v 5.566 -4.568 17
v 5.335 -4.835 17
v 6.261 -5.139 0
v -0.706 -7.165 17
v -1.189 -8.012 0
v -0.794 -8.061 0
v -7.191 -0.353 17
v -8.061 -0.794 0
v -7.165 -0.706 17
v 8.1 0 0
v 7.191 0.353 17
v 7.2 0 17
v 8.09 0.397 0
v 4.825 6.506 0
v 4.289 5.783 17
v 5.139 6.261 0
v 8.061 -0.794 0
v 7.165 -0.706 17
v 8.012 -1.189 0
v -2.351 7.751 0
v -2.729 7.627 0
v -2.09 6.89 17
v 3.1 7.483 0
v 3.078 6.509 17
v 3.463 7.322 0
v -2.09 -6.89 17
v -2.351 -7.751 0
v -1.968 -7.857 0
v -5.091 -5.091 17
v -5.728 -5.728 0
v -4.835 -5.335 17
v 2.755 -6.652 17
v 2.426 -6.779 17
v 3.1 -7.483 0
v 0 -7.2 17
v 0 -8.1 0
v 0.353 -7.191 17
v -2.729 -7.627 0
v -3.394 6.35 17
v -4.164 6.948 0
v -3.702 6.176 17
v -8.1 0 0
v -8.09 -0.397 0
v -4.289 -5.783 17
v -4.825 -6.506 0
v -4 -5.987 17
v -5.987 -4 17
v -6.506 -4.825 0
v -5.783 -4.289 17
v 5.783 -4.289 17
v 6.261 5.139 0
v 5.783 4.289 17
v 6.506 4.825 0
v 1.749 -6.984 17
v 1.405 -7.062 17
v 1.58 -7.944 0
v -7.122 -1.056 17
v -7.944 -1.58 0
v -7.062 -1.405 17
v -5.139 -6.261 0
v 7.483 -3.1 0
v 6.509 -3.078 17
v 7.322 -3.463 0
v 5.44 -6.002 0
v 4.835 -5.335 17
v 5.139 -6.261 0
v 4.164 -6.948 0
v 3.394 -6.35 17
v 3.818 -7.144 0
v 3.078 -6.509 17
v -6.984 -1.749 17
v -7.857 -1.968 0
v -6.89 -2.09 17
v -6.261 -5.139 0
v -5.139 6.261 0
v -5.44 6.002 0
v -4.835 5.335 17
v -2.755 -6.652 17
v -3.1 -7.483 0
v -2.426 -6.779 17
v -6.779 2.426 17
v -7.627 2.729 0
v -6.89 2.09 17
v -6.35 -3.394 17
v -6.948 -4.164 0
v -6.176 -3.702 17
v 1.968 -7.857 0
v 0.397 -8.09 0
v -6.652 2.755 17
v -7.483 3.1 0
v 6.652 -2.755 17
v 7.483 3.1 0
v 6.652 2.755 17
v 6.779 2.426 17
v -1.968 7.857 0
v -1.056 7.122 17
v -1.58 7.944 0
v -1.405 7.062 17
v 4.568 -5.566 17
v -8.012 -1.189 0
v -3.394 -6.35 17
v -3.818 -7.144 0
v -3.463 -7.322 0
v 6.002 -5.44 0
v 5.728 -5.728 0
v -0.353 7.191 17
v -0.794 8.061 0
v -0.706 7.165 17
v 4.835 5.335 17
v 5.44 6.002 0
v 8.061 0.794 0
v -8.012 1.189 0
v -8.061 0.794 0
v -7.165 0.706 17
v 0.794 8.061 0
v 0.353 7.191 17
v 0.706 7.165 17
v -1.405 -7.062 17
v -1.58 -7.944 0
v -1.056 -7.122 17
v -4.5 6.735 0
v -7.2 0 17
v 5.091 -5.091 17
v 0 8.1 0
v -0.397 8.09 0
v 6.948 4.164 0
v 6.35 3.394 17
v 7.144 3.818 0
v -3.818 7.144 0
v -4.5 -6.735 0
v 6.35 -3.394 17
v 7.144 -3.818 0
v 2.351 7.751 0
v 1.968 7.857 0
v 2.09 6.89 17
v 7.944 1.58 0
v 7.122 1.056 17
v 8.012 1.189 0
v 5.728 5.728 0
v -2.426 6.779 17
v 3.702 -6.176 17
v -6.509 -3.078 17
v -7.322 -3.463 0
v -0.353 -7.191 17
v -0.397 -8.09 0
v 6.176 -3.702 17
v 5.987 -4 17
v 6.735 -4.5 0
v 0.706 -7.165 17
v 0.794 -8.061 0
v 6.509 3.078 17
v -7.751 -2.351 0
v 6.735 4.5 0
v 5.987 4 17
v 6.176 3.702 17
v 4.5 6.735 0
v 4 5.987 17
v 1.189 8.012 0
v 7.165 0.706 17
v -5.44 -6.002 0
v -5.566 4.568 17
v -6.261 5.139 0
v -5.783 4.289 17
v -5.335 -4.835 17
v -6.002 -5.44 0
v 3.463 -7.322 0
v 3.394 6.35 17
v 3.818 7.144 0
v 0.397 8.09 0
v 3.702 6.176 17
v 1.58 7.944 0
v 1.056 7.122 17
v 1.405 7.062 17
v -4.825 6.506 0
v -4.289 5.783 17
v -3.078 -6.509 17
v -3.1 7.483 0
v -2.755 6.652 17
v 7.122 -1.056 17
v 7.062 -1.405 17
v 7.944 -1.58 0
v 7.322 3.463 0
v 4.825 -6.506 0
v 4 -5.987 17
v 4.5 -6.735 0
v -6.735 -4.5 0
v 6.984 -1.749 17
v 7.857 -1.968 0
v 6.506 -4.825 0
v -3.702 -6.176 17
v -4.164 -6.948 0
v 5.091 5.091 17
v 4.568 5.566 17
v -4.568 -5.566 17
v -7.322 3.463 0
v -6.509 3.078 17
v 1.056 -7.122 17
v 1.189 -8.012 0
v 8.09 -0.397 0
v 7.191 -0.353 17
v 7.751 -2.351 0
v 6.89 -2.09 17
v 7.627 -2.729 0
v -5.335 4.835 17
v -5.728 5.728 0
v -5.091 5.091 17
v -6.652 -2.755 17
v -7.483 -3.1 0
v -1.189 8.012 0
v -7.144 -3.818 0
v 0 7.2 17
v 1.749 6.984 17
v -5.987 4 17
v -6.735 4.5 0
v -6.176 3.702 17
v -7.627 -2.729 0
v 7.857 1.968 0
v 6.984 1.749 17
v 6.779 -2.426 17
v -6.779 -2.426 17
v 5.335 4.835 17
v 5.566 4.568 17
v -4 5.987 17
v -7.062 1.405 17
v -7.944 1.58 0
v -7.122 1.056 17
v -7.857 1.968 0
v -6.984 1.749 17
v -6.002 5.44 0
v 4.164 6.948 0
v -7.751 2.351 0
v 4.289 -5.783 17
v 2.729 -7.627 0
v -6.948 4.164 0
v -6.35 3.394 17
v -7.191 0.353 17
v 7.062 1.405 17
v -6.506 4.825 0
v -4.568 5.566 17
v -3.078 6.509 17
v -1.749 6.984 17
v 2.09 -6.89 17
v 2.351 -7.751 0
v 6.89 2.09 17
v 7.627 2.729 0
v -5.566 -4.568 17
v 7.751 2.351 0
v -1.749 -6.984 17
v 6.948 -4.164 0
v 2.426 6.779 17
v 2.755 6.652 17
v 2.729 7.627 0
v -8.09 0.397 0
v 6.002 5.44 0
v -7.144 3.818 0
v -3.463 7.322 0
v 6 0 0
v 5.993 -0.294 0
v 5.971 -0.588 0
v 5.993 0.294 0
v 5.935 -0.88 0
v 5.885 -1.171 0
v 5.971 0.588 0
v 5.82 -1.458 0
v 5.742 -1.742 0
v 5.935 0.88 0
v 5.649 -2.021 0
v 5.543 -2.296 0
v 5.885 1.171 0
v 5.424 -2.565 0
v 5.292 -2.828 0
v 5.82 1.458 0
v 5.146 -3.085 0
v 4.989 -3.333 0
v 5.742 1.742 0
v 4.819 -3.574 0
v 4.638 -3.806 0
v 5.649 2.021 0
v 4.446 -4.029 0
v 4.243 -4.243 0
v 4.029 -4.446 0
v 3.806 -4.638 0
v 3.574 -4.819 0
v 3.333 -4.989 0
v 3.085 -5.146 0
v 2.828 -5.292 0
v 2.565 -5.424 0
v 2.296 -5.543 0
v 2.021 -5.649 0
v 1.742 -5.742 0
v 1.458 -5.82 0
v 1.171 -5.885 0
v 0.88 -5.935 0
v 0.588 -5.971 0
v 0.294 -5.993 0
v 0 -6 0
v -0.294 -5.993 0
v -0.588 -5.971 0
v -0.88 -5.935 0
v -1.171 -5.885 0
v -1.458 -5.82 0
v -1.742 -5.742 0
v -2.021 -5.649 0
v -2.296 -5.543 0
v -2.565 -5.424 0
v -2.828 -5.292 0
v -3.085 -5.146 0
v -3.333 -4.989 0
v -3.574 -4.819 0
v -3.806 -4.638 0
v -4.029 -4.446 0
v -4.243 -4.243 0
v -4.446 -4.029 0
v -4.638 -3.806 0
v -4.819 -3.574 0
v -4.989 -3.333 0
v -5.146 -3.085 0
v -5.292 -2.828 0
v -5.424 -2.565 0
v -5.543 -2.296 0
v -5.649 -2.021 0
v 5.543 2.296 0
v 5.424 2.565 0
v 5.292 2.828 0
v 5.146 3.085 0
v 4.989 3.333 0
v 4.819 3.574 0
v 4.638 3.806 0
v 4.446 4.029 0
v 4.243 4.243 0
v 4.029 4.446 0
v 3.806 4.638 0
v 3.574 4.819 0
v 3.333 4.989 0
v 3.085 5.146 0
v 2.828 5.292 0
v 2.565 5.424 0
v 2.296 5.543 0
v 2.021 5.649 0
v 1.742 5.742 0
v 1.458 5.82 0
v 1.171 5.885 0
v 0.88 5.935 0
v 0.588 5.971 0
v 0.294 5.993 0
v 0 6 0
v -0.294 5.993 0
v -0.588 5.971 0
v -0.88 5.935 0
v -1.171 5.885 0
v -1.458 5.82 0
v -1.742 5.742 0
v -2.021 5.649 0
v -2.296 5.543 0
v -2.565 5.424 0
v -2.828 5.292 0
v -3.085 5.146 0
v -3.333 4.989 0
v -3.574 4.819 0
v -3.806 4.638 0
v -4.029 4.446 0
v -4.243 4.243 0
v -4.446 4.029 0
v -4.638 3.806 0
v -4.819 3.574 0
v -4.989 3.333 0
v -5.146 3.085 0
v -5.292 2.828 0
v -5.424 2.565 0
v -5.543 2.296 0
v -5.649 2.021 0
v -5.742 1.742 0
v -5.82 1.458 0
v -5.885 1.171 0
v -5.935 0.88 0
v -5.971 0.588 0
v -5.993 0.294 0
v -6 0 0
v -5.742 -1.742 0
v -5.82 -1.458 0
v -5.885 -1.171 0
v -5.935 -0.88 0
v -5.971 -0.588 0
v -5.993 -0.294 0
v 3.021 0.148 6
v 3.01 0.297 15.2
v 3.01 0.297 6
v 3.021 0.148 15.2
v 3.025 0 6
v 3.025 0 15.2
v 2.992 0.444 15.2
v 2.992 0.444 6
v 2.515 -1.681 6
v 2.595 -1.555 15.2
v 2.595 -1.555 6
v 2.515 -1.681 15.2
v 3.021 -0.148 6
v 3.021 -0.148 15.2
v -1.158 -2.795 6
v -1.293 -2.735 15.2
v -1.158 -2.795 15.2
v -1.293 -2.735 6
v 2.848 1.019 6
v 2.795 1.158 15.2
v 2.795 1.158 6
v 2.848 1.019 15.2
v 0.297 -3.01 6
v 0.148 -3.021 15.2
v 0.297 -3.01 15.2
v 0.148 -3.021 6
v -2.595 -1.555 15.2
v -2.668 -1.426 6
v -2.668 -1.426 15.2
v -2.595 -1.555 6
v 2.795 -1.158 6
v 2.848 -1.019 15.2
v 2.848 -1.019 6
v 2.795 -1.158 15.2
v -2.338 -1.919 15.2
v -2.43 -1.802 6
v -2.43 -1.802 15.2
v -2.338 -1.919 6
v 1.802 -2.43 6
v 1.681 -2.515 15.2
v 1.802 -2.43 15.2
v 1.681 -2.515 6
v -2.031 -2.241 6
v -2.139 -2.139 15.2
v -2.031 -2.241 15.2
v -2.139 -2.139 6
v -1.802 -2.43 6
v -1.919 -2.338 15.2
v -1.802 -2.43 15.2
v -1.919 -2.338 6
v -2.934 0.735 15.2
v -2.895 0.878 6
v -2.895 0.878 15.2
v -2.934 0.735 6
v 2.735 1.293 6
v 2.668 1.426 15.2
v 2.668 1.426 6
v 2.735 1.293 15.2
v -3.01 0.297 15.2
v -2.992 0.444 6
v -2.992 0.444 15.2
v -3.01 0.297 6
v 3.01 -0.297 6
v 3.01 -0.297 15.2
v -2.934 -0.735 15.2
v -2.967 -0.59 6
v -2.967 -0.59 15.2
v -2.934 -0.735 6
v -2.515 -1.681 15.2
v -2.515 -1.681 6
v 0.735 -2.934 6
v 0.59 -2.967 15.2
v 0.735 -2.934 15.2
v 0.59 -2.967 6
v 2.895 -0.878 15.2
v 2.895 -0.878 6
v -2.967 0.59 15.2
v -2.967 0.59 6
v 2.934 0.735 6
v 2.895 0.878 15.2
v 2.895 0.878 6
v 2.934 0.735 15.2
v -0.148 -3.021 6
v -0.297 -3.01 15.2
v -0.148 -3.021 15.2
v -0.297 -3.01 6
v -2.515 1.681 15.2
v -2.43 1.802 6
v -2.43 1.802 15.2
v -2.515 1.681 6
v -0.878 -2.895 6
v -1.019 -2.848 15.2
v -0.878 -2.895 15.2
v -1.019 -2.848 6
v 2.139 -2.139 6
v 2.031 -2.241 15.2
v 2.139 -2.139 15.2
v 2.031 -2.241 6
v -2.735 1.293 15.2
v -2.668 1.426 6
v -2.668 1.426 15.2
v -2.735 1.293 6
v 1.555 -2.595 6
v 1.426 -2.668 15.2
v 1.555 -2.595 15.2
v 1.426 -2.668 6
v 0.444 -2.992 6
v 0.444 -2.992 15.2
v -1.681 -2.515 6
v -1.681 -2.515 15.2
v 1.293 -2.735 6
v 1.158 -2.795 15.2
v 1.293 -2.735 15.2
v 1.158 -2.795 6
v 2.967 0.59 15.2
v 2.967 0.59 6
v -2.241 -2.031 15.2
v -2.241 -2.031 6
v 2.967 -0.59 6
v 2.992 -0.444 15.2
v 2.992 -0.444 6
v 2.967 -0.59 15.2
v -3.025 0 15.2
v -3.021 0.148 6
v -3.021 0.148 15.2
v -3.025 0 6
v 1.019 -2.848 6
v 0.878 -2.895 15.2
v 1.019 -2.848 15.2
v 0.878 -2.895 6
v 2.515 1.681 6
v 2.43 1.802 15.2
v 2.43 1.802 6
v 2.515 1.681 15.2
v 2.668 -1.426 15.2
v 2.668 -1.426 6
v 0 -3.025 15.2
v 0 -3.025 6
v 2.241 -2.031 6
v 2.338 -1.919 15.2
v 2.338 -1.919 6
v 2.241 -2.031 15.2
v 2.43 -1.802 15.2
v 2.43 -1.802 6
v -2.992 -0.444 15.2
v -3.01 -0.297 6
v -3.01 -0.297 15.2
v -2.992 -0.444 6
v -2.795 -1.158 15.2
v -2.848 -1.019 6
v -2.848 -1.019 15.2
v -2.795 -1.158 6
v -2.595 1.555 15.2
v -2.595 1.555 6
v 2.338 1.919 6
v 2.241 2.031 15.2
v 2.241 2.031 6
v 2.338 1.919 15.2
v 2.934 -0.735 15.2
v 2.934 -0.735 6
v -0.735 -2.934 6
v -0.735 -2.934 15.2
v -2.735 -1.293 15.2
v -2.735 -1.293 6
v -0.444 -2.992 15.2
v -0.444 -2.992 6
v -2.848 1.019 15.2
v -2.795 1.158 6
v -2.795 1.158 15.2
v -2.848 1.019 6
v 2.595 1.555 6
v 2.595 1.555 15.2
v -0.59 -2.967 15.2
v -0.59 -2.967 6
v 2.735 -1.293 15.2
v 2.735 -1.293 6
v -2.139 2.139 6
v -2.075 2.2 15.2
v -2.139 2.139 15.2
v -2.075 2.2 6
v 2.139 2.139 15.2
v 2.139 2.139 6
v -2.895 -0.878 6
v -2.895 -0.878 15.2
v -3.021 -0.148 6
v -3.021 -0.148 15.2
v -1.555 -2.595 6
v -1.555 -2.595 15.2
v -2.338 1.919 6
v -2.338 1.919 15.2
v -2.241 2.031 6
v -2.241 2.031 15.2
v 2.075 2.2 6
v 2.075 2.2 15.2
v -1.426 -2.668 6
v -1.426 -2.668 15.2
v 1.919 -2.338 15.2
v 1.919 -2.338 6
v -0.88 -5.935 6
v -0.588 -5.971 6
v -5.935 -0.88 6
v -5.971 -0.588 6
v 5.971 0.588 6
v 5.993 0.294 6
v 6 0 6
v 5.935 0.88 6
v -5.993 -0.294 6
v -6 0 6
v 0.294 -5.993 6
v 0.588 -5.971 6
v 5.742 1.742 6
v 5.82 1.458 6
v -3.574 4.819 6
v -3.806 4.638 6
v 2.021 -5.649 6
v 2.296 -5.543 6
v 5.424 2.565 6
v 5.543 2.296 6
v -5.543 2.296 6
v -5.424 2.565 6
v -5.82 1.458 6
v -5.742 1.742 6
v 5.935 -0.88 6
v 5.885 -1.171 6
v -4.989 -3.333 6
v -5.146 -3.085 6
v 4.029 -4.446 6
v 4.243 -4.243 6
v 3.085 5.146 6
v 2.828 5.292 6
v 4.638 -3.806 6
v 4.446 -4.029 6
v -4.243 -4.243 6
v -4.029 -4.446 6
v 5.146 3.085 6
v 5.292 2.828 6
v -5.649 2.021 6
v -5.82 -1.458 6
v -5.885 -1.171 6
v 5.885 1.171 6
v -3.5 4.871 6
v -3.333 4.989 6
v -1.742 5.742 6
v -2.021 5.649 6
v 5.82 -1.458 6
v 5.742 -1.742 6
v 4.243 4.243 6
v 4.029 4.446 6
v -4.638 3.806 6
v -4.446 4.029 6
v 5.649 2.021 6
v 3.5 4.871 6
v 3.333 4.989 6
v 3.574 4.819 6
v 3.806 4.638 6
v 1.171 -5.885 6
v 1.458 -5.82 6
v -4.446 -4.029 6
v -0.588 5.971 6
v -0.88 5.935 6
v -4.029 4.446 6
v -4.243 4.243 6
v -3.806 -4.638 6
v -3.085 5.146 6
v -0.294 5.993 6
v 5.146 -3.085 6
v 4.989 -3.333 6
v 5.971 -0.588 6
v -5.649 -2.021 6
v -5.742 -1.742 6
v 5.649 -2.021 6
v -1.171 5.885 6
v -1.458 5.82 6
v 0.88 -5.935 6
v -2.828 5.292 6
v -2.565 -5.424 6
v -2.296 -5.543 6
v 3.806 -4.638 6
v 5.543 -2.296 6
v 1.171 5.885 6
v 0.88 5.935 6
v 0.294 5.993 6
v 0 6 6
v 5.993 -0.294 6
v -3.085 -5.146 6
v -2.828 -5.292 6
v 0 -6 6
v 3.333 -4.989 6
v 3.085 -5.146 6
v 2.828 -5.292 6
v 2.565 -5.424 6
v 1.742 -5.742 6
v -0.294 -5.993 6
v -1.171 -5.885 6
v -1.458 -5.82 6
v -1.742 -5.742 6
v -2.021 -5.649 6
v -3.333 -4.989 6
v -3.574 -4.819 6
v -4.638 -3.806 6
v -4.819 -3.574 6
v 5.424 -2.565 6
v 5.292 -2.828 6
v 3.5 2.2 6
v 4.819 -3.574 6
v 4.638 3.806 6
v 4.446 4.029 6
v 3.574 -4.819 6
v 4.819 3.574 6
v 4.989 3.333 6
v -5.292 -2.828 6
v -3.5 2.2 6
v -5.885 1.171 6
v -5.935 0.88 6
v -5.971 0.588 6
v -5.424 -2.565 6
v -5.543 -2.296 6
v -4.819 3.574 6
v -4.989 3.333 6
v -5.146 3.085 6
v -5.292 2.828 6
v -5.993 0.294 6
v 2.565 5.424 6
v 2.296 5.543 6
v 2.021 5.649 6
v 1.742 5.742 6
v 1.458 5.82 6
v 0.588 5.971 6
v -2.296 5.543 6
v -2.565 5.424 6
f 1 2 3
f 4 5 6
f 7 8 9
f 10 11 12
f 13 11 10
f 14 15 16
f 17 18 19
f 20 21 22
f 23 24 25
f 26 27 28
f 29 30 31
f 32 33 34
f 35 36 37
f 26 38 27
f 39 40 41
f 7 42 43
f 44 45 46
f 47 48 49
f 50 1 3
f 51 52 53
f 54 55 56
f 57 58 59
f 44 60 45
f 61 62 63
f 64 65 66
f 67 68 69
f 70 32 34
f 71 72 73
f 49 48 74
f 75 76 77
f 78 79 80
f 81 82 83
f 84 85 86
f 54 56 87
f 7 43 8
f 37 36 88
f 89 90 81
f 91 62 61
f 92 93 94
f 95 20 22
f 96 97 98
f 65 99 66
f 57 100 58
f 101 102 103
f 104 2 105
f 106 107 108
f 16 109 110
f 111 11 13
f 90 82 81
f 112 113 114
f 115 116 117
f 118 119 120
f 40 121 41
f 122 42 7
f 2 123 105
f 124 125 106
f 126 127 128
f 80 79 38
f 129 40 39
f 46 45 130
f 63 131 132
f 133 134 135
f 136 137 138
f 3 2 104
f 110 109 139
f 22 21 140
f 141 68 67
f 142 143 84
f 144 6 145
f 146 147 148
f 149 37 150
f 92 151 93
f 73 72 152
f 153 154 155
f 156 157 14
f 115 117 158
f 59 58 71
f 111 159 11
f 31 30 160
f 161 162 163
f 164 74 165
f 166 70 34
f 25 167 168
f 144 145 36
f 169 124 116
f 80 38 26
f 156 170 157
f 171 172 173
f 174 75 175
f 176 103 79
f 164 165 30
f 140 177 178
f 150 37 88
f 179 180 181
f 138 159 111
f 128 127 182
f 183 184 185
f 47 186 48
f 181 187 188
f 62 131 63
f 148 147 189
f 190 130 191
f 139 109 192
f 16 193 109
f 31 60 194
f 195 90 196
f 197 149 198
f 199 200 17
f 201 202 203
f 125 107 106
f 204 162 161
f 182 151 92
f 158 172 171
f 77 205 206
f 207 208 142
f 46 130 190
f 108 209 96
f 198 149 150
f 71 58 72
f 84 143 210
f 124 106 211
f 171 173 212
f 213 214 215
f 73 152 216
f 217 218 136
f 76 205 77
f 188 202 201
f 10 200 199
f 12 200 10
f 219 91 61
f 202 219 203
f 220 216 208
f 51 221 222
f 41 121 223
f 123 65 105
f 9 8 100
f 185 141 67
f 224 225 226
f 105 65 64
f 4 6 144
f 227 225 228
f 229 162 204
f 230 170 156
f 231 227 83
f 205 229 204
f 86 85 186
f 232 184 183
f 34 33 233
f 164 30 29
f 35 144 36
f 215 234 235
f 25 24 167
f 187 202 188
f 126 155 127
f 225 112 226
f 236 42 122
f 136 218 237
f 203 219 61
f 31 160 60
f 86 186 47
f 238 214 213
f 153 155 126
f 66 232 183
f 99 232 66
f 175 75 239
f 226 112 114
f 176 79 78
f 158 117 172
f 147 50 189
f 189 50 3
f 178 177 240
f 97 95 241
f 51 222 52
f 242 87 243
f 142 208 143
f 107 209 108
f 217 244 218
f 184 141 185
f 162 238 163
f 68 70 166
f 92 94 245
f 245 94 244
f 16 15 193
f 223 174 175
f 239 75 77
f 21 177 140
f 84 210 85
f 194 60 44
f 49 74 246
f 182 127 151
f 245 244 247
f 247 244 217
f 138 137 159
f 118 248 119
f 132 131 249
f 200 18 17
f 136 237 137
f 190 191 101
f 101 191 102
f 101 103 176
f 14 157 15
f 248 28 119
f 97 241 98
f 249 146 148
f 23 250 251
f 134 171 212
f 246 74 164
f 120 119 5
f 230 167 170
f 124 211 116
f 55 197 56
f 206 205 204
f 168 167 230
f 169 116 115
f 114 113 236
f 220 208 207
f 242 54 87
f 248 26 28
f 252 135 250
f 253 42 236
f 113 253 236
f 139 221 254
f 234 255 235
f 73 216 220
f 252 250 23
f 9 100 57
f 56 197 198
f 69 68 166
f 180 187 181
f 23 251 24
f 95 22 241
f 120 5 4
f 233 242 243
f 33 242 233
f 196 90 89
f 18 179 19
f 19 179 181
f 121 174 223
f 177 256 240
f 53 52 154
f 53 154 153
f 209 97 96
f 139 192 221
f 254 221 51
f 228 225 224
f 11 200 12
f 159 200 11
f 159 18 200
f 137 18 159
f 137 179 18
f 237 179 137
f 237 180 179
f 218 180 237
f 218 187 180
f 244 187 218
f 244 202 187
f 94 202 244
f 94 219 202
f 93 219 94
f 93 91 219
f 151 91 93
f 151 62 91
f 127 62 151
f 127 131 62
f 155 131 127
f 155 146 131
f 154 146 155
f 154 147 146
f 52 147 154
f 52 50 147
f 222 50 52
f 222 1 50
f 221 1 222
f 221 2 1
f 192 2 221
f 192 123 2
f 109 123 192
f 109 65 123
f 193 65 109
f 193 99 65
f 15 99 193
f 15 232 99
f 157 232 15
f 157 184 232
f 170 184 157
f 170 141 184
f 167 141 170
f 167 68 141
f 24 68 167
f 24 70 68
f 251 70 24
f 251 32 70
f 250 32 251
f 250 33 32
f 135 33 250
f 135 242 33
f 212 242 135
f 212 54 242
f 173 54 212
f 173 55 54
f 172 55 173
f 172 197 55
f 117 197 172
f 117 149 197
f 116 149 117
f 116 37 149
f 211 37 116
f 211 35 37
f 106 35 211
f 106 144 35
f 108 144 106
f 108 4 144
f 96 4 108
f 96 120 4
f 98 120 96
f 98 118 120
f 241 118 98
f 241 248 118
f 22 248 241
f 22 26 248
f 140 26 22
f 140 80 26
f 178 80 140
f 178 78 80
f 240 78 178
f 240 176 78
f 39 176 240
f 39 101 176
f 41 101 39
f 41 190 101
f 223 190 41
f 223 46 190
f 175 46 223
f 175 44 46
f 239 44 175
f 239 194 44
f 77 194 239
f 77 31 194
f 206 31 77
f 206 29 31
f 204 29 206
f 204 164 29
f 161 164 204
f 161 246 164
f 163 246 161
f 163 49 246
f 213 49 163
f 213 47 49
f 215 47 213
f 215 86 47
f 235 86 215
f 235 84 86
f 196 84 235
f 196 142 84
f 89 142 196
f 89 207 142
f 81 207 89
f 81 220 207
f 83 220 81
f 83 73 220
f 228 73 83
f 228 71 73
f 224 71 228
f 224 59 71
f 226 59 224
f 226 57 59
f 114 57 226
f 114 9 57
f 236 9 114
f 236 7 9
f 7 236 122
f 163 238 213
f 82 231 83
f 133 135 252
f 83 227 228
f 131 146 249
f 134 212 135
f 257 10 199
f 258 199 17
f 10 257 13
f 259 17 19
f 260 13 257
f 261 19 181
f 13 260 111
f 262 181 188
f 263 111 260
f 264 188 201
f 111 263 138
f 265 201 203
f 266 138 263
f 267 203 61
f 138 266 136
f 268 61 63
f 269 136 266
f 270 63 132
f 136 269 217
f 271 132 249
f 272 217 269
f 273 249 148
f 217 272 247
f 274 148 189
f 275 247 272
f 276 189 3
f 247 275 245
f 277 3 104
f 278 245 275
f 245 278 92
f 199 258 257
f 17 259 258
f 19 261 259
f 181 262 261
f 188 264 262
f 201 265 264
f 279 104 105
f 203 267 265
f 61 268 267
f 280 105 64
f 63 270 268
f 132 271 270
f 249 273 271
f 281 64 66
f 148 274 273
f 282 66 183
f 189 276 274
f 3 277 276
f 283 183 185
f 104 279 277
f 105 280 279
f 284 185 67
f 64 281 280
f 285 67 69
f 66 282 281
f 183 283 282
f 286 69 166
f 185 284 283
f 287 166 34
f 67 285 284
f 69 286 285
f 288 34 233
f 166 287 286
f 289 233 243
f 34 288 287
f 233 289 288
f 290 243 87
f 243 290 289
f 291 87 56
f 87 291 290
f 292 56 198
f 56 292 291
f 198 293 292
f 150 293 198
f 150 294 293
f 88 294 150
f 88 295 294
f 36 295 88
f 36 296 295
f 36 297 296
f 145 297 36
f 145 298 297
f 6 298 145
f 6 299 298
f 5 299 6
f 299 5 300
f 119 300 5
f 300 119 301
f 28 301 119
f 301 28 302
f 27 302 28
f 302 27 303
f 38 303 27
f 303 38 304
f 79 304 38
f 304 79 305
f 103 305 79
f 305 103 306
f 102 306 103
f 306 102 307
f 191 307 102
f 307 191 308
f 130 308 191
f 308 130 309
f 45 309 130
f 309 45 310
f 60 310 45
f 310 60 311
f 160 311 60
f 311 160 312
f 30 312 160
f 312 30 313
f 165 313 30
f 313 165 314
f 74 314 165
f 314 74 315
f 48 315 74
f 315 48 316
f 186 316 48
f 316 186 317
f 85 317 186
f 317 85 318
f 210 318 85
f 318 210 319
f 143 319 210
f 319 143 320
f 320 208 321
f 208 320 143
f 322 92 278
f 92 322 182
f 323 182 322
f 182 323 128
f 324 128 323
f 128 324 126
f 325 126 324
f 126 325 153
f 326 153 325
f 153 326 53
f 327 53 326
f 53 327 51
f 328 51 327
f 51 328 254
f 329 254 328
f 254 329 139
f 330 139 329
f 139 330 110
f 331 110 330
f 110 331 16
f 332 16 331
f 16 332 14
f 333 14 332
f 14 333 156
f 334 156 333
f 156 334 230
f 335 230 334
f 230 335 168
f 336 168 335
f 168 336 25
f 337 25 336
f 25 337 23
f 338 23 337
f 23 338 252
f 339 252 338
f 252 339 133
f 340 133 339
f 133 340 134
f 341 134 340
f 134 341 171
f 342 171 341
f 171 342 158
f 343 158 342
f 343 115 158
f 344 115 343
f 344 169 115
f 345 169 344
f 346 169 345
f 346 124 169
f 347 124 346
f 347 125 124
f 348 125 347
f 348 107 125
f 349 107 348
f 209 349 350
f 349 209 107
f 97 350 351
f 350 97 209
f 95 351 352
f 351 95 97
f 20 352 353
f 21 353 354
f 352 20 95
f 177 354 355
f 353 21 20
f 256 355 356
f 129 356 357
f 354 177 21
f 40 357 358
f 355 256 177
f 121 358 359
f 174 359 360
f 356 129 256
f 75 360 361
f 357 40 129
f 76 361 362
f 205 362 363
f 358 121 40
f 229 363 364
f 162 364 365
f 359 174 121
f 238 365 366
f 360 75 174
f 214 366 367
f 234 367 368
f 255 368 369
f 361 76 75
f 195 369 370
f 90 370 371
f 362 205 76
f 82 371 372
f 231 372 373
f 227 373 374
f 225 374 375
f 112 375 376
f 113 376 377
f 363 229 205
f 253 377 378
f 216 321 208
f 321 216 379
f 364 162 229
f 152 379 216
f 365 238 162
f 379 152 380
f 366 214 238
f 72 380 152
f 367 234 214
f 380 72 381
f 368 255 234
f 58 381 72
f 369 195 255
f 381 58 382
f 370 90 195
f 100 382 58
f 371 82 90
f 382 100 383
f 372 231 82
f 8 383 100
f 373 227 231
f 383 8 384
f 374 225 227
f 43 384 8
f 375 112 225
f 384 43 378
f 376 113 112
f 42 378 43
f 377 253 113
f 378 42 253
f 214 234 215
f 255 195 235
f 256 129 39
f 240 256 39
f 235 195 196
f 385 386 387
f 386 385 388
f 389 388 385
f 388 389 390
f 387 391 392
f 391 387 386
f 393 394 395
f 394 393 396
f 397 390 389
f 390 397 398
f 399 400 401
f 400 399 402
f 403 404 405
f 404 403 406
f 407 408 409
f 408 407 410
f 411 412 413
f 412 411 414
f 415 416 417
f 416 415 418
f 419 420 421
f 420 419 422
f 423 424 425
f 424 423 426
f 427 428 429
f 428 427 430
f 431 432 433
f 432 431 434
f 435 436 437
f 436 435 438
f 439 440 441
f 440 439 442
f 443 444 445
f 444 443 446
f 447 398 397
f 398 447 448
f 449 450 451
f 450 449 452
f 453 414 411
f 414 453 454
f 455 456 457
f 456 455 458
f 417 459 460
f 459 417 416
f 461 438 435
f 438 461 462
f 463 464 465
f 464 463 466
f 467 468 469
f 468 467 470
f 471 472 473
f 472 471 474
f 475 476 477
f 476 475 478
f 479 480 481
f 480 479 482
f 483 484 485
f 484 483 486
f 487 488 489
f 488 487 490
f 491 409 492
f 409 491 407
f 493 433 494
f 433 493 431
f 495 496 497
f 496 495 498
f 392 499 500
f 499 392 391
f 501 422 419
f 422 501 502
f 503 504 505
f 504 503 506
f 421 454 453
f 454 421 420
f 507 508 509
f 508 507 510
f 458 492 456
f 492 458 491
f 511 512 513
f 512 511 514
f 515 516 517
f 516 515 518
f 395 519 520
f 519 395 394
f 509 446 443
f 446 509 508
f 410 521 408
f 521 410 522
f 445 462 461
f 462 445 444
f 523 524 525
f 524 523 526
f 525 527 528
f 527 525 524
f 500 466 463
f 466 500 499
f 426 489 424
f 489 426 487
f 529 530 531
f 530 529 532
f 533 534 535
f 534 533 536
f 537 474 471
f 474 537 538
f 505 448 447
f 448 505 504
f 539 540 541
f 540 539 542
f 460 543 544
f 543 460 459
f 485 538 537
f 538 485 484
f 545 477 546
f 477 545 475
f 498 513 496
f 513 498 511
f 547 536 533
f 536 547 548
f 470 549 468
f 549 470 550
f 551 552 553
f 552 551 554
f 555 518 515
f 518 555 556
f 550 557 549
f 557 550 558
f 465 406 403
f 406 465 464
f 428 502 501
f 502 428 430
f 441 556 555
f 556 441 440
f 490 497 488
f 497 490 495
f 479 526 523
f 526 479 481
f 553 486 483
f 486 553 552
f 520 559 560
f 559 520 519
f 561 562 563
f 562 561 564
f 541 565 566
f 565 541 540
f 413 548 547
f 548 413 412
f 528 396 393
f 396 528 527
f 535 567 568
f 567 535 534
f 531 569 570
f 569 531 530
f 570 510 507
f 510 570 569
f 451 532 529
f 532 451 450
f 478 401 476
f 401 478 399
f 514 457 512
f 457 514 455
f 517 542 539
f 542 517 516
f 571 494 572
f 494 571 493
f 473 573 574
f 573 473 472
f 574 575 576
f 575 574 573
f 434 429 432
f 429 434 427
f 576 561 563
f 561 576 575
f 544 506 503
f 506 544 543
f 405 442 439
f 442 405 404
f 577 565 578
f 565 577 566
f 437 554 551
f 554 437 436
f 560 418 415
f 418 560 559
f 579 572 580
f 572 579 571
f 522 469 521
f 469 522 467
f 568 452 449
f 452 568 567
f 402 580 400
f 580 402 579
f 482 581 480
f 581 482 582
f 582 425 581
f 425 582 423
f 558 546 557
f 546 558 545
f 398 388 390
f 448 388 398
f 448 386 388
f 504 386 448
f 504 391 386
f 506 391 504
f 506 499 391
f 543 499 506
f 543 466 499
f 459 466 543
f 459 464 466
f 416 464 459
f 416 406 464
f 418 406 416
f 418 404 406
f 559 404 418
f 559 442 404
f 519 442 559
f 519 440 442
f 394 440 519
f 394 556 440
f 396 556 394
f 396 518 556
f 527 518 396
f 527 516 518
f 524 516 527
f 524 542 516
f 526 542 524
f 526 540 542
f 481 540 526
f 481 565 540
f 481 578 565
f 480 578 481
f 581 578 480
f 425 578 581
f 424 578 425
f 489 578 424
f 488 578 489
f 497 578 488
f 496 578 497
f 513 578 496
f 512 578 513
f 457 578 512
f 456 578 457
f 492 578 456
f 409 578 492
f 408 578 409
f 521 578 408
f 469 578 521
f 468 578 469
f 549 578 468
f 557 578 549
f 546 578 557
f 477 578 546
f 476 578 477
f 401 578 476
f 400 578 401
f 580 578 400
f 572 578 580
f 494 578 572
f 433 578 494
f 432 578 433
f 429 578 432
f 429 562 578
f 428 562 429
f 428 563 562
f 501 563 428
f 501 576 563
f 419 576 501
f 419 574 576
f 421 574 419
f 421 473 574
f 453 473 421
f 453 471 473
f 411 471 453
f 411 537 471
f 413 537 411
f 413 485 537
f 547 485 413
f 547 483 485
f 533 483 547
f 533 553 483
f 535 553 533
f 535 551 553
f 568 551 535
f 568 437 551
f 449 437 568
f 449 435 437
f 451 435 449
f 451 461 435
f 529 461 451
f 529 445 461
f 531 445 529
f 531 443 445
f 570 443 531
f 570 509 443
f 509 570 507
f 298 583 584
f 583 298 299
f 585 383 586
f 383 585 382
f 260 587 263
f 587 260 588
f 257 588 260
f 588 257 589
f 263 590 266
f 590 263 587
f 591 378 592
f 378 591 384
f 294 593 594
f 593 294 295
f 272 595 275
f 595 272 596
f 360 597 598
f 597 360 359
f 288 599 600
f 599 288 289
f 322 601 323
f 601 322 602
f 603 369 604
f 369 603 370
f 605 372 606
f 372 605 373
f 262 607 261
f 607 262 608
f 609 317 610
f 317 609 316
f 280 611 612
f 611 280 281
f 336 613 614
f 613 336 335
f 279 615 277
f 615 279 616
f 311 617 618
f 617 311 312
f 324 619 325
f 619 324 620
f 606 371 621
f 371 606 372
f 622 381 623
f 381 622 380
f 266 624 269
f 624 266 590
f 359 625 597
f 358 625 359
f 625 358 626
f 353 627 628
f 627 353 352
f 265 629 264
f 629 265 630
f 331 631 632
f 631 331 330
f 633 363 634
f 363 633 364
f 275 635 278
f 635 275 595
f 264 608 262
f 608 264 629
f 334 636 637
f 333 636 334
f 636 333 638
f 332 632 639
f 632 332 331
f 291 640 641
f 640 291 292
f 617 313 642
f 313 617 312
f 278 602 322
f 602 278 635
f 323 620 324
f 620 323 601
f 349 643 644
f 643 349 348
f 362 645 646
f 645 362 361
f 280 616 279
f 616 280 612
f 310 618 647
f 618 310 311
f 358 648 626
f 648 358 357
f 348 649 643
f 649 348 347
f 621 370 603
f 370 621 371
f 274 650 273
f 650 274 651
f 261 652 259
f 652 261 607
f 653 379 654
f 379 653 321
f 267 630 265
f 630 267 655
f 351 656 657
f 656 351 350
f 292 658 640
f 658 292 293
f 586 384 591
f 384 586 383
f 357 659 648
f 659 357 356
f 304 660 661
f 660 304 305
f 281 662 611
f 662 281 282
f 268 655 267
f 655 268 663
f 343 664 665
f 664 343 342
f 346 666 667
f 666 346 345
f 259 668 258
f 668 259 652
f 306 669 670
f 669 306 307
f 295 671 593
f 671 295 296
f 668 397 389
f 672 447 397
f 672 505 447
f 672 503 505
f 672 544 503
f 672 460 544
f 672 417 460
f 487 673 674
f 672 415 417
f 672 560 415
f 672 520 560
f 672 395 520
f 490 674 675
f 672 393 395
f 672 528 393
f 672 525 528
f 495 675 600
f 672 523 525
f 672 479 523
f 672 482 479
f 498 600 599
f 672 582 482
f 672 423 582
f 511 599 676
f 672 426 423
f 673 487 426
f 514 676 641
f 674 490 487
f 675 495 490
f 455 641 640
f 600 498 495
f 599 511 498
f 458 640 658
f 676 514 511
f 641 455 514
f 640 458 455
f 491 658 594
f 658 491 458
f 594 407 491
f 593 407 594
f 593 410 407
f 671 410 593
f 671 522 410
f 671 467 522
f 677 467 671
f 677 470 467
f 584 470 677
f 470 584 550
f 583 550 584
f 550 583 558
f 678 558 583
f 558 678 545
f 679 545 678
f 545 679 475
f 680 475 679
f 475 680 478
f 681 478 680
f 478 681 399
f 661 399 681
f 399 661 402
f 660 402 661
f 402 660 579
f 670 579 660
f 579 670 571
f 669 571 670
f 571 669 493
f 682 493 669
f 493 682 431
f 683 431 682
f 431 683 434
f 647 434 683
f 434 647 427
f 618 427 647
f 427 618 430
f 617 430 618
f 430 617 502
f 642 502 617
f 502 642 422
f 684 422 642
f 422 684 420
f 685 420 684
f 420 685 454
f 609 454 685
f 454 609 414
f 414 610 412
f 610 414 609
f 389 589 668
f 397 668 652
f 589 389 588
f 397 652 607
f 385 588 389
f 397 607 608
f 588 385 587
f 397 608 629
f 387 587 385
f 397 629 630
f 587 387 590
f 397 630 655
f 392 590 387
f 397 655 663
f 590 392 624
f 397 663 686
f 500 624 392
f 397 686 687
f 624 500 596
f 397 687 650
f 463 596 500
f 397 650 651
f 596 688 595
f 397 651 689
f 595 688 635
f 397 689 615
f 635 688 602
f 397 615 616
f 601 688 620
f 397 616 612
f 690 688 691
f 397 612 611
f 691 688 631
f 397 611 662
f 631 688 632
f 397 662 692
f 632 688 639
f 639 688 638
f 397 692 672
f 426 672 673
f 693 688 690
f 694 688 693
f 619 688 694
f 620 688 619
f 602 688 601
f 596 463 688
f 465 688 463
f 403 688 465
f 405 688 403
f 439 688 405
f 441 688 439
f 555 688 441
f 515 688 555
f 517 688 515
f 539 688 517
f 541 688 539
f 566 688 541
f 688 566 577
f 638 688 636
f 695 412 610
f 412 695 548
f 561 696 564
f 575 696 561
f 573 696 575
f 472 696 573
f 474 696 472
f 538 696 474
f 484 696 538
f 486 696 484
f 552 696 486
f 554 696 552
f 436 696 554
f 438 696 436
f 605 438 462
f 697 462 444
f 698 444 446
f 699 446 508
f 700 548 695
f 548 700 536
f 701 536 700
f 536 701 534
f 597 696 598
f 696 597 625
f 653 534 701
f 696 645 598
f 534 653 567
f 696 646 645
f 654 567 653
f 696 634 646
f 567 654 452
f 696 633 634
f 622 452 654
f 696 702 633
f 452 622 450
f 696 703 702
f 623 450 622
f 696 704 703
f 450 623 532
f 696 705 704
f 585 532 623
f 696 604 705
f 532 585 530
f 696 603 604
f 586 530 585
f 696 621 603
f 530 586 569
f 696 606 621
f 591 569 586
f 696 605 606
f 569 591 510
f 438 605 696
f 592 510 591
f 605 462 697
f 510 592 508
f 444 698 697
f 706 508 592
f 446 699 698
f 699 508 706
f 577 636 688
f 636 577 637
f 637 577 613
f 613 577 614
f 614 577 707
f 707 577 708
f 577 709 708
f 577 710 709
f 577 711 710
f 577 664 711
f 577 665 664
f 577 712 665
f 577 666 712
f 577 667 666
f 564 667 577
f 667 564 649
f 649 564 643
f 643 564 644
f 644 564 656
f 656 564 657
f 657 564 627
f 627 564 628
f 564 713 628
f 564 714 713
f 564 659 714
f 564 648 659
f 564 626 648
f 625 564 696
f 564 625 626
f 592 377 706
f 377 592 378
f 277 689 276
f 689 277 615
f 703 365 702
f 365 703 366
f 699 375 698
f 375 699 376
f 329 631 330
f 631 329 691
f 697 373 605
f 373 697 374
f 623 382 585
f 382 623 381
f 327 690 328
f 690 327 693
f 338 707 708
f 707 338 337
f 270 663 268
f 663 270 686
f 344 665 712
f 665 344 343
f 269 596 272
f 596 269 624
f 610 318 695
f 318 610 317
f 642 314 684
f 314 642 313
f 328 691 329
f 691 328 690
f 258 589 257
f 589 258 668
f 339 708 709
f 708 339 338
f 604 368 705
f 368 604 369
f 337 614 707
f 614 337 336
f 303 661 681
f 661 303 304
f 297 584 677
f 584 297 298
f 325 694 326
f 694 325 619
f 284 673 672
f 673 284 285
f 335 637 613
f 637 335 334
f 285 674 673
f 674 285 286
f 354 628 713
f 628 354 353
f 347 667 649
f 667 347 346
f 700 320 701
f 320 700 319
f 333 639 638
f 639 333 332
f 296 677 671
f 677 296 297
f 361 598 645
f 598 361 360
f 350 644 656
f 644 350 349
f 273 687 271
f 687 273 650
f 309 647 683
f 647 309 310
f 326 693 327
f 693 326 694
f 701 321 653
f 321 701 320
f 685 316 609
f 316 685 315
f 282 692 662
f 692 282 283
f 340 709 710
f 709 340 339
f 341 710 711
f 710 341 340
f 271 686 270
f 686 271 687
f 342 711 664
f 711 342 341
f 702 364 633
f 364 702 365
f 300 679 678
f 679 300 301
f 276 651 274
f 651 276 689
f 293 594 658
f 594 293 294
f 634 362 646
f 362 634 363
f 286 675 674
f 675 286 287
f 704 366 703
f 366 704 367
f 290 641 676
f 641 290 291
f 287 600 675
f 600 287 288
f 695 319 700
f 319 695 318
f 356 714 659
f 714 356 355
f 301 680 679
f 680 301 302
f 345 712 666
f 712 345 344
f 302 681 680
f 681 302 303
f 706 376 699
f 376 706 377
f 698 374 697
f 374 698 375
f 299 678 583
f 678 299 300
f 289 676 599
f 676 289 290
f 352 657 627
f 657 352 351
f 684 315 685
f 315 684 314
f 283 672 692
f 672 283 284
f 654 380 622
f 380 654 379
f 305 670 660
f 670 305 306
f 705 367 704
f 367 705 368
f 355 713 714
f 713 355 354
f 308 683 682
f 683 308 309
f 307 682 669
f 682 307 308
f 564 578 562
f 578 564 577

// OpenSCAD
// Definitions
// **************************

inner_dia = 12;
thick = 1.2;

//Definition of circle angular resolution
$fn = 128;  

difference() {
    union() {
    translate ([0,0,0]) cylinder (h=17,r2=(inner_dia+thick*2)/2, r1=(inner_dia+thick+3)/2);

        
    }
    
    translate ([0,0,-thick/2]) cylinder (h=17-thick,r=6.05/2);
    
    
    translate ([0,0,0]) cylinder (h=6,r=inner_dia/2);


}
     
translate ([0,4.2,11]) cube ([7,4,10], center=true);



 
